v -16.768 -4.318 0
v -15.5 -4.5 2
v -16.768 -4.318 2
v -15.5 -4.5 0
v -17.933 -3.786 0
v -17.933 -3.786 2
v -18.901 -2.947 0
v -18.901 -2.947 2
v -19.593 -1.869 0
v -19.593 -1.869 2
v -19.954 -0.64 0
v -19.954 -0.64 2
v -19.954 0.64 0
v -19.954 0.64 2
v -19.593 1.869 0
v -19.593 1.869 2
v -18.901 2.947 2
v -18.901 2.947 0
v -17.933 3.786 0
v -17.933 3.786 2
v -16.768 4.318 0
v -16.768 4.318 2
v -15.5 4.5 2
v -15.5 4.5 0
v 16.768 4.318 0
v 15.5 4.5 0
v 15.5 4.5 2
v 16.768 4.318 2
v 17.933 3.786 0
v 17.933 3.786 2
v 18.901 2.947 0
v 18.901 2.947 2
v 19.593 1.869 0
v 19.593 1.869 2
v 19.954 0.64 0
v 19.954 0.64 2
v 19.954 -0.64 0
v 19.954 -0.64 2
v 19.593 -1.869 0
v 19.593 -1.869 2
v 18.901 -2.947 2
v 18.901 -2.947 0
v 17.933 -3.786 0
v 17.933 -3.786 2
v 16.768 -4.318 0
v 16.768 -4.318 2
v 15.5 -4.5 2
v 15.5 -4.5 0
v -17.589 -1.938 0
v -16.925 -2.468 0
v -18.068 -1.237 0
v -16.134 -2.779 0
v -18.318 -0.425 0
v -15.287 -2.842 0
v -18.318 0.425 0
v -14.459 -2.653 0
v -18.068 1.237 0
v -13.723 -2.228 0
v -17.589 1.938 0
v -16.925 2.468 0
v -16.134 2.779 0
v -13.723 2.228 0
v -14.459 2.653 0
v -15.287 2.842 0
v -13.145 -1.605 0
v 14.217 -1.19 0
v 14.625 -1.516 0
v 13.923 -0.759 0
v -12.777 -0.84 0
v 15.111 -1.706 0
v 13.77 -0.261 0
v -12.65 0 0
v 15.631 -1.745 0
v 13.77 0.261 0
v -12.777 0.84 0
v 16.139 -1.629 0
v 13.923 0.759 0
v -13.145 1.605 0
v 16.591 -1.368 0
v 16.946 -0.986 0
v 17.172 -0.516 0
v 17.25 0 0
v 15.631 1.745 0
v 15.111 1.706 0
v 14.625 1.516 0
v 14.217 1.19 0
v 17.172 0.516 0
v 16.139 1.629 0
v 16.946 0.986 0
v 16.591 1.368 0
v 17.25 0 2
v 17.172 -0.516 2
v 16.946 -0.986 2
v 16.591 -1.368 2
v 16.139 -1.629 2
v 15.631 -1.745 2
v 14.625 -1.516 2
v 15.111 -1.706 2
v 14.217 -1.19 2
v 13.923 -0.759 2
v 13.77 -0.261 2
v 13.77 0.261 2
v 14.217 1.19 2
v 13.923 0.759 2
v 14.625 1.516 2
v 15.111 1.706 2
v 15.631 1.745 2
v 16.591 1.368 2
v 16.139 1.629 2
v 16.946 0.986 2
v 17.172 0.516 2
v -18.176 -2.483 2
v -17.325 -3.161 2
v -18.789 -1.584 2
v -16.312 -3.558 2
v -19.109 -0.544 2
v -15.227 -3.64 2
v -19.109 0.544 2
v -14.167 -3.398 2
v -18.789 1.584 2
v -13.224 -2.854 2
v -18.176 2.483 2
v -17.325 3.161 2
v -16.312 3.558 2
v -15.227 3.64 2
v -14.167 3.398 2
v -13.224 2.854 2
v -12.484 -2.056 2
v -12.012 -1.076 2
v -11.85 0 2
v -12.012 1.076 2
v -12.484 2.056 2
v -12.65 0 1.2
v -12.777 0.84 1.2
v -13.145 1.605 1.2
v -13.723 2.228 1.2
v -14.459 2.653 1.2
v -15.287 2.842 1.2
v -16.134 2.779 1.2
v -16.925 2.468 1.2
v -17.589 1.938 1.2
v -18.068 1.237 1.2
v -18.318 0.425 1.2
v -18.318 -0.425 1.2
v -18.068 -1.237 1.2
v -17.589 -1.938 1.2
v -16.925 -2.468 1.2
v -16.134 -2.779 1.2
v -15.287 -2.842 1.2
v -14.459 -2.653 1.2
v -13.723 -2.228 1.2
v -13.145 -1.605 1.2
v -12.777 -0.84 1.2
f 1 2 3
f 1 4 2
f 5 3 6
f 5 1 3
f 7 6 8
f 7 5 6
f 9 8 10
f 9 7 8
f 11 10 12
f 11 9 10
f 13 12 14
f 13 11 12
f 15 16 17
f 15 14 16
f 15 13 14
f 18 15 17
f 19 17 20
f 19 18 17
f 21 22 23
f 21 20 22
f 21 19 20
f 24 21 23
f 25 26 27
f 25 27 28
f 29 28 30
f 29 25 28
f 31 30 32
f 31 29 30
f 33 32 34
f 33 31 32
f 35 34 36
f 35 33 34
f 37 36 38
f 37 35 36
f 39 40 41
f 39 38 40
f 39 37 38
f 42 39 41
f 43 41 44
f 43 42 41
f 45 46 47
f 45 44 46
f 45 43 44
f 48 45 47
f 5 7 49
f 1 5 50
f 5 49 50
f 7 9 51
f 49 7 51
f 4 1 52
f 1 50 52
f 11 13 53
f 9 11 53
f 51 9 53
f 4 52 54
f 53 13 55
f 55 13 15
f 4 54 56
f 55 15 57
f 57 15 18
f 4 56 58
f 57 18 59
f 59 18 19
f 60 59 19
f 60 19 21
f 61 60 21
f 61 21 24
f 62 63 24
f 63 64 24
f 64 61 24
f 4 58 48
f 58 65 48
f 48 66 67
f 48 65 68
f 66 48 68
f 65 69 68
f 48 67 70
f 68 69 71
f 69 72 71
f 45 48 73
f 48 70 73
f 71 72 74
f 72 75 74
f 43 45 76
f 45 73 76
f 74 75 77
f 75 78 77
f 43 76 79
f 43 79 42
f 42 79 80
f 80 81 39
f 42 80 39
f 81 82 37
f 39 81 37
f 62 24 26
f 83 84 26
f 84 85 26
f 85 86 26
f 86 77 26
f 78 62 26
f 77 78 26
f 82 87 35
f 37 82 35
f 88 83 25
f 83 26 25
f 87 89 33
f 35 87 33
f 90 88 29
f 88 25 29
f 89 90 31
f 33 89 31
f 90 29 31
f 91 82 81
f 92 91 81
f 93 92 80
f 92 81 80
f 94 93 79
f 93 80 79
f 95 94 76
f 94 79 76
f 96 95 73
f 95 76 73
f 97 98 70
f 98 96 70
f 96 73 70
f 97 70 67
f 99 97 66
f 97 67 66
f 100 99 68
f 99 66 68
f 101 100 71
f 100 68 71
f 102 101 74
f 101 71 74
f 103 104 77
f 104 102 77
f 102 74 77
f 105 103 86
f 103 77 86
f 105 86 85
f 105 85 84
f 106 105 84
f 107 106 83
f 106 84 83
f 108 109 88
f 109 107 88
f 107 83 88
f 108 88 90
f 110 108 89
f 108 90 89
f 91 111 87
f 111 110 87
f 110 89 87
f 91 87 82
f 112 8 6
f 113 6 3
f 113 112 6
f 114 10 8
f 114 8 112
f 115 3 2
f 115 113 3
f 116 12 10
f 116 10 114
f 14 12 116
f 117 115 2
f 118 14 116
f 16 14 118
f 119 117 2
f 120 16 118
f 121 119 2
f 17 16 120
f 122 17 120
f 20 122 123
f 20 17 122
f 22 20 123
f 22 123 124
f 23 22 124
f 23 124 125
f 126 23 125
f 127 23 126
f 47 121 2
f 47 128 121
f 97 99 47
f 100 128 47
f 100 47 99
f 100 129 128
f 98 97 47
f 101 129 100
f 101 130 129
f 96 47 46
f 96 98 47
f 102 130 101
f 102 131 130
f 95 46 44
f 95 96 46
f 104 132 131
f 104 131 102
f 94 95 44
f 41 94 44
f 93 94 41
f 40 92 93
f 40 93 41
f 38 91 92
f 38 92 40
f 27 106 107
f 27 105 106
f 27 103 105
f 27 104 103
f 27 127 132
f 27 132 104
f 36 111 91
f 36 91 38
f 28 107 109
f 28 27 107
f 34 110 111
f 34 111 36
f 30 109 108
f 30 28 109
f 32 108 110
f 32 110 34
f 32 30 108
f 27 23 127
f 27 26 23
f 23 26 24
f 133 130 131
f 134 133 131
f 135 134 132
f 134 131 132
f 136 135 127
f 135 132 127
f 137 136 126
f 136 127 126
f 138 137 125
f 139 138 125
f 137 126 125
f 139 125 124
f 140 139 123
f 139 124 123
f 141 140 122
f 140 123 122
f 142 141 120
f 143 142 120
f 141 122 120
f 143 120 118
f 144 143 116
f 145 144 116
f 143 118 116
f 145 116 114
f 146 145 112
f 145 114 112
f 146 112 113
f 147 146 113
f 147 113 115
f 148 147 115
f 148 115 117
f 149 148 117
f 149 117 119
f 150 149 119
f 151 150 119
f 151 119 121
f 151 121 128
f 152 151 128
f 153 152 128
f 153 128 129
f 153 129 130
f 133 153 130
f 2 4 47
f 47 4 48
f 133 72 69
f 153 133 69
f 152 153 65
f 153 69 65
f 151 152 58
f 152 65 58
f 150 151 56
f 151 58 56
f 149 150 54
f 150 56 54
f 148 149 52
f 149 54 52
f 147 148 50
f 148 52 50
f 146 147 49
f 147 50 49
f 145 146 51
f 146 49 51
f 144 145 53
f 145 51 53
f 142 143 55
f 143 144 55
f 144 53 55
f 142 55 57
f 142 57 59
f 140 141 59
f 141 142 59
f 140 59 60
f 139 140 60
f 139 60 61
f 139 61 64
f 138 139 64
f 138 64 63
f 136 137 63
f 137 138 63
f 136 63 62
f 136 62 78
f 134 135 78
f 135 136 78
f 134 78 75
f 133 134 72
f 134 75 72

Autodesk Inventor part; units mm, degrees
ref_plane "YZ Plane" through (0, 0, 0) normal (1, 0, 0) x (0, 1, 0)
ref_plane "XZ Plane" through (0, 0, 0) normal (0, 1, 0) x (-1, 0, 0)
ref_plane "XY Plane" through (0, 0, 0) normal (0, 0, 1) x (1, 0, 0)
sketch "Sketch1" plane through (0, 0, 0) normal (0, 0, 1) x (1, 0, 0)
  line L0 (-15.5, 0) -> (15.5, 0) construction
  line L1 (-15.5, -4.5) -> (15.5, -4.5)
  line L2 (15.5, 4.5) -> (-15.5, 4.5)
  arc A0 (-15.5, 4.5) -> (-15.5, -4.5) centre (-15.5, 0) ccw
  arc A1 (15.5, -4.5) -> (15.5, 4.5) centre (15.5, 0) ccw
  circle A2 centre (-15.5, 0) radius 2.85
  circle A3 centre (15.5, 0) radius 1.75
  point P0 (0, 0)
  point P1 (0, 0)
  dimension "d0" = 9
  dimension "d1" = 31
  dimension "d2" = 5.7
  dimension "d3" = 3.5
extrude "Extrusion1" add sketch "Sketch1" along normal blind 2
chamfer "Chamfer1" distance 0.8 angle 45 1 edges at (-18.35, 0, 2)
properties part number "gripper_mechanism2"
